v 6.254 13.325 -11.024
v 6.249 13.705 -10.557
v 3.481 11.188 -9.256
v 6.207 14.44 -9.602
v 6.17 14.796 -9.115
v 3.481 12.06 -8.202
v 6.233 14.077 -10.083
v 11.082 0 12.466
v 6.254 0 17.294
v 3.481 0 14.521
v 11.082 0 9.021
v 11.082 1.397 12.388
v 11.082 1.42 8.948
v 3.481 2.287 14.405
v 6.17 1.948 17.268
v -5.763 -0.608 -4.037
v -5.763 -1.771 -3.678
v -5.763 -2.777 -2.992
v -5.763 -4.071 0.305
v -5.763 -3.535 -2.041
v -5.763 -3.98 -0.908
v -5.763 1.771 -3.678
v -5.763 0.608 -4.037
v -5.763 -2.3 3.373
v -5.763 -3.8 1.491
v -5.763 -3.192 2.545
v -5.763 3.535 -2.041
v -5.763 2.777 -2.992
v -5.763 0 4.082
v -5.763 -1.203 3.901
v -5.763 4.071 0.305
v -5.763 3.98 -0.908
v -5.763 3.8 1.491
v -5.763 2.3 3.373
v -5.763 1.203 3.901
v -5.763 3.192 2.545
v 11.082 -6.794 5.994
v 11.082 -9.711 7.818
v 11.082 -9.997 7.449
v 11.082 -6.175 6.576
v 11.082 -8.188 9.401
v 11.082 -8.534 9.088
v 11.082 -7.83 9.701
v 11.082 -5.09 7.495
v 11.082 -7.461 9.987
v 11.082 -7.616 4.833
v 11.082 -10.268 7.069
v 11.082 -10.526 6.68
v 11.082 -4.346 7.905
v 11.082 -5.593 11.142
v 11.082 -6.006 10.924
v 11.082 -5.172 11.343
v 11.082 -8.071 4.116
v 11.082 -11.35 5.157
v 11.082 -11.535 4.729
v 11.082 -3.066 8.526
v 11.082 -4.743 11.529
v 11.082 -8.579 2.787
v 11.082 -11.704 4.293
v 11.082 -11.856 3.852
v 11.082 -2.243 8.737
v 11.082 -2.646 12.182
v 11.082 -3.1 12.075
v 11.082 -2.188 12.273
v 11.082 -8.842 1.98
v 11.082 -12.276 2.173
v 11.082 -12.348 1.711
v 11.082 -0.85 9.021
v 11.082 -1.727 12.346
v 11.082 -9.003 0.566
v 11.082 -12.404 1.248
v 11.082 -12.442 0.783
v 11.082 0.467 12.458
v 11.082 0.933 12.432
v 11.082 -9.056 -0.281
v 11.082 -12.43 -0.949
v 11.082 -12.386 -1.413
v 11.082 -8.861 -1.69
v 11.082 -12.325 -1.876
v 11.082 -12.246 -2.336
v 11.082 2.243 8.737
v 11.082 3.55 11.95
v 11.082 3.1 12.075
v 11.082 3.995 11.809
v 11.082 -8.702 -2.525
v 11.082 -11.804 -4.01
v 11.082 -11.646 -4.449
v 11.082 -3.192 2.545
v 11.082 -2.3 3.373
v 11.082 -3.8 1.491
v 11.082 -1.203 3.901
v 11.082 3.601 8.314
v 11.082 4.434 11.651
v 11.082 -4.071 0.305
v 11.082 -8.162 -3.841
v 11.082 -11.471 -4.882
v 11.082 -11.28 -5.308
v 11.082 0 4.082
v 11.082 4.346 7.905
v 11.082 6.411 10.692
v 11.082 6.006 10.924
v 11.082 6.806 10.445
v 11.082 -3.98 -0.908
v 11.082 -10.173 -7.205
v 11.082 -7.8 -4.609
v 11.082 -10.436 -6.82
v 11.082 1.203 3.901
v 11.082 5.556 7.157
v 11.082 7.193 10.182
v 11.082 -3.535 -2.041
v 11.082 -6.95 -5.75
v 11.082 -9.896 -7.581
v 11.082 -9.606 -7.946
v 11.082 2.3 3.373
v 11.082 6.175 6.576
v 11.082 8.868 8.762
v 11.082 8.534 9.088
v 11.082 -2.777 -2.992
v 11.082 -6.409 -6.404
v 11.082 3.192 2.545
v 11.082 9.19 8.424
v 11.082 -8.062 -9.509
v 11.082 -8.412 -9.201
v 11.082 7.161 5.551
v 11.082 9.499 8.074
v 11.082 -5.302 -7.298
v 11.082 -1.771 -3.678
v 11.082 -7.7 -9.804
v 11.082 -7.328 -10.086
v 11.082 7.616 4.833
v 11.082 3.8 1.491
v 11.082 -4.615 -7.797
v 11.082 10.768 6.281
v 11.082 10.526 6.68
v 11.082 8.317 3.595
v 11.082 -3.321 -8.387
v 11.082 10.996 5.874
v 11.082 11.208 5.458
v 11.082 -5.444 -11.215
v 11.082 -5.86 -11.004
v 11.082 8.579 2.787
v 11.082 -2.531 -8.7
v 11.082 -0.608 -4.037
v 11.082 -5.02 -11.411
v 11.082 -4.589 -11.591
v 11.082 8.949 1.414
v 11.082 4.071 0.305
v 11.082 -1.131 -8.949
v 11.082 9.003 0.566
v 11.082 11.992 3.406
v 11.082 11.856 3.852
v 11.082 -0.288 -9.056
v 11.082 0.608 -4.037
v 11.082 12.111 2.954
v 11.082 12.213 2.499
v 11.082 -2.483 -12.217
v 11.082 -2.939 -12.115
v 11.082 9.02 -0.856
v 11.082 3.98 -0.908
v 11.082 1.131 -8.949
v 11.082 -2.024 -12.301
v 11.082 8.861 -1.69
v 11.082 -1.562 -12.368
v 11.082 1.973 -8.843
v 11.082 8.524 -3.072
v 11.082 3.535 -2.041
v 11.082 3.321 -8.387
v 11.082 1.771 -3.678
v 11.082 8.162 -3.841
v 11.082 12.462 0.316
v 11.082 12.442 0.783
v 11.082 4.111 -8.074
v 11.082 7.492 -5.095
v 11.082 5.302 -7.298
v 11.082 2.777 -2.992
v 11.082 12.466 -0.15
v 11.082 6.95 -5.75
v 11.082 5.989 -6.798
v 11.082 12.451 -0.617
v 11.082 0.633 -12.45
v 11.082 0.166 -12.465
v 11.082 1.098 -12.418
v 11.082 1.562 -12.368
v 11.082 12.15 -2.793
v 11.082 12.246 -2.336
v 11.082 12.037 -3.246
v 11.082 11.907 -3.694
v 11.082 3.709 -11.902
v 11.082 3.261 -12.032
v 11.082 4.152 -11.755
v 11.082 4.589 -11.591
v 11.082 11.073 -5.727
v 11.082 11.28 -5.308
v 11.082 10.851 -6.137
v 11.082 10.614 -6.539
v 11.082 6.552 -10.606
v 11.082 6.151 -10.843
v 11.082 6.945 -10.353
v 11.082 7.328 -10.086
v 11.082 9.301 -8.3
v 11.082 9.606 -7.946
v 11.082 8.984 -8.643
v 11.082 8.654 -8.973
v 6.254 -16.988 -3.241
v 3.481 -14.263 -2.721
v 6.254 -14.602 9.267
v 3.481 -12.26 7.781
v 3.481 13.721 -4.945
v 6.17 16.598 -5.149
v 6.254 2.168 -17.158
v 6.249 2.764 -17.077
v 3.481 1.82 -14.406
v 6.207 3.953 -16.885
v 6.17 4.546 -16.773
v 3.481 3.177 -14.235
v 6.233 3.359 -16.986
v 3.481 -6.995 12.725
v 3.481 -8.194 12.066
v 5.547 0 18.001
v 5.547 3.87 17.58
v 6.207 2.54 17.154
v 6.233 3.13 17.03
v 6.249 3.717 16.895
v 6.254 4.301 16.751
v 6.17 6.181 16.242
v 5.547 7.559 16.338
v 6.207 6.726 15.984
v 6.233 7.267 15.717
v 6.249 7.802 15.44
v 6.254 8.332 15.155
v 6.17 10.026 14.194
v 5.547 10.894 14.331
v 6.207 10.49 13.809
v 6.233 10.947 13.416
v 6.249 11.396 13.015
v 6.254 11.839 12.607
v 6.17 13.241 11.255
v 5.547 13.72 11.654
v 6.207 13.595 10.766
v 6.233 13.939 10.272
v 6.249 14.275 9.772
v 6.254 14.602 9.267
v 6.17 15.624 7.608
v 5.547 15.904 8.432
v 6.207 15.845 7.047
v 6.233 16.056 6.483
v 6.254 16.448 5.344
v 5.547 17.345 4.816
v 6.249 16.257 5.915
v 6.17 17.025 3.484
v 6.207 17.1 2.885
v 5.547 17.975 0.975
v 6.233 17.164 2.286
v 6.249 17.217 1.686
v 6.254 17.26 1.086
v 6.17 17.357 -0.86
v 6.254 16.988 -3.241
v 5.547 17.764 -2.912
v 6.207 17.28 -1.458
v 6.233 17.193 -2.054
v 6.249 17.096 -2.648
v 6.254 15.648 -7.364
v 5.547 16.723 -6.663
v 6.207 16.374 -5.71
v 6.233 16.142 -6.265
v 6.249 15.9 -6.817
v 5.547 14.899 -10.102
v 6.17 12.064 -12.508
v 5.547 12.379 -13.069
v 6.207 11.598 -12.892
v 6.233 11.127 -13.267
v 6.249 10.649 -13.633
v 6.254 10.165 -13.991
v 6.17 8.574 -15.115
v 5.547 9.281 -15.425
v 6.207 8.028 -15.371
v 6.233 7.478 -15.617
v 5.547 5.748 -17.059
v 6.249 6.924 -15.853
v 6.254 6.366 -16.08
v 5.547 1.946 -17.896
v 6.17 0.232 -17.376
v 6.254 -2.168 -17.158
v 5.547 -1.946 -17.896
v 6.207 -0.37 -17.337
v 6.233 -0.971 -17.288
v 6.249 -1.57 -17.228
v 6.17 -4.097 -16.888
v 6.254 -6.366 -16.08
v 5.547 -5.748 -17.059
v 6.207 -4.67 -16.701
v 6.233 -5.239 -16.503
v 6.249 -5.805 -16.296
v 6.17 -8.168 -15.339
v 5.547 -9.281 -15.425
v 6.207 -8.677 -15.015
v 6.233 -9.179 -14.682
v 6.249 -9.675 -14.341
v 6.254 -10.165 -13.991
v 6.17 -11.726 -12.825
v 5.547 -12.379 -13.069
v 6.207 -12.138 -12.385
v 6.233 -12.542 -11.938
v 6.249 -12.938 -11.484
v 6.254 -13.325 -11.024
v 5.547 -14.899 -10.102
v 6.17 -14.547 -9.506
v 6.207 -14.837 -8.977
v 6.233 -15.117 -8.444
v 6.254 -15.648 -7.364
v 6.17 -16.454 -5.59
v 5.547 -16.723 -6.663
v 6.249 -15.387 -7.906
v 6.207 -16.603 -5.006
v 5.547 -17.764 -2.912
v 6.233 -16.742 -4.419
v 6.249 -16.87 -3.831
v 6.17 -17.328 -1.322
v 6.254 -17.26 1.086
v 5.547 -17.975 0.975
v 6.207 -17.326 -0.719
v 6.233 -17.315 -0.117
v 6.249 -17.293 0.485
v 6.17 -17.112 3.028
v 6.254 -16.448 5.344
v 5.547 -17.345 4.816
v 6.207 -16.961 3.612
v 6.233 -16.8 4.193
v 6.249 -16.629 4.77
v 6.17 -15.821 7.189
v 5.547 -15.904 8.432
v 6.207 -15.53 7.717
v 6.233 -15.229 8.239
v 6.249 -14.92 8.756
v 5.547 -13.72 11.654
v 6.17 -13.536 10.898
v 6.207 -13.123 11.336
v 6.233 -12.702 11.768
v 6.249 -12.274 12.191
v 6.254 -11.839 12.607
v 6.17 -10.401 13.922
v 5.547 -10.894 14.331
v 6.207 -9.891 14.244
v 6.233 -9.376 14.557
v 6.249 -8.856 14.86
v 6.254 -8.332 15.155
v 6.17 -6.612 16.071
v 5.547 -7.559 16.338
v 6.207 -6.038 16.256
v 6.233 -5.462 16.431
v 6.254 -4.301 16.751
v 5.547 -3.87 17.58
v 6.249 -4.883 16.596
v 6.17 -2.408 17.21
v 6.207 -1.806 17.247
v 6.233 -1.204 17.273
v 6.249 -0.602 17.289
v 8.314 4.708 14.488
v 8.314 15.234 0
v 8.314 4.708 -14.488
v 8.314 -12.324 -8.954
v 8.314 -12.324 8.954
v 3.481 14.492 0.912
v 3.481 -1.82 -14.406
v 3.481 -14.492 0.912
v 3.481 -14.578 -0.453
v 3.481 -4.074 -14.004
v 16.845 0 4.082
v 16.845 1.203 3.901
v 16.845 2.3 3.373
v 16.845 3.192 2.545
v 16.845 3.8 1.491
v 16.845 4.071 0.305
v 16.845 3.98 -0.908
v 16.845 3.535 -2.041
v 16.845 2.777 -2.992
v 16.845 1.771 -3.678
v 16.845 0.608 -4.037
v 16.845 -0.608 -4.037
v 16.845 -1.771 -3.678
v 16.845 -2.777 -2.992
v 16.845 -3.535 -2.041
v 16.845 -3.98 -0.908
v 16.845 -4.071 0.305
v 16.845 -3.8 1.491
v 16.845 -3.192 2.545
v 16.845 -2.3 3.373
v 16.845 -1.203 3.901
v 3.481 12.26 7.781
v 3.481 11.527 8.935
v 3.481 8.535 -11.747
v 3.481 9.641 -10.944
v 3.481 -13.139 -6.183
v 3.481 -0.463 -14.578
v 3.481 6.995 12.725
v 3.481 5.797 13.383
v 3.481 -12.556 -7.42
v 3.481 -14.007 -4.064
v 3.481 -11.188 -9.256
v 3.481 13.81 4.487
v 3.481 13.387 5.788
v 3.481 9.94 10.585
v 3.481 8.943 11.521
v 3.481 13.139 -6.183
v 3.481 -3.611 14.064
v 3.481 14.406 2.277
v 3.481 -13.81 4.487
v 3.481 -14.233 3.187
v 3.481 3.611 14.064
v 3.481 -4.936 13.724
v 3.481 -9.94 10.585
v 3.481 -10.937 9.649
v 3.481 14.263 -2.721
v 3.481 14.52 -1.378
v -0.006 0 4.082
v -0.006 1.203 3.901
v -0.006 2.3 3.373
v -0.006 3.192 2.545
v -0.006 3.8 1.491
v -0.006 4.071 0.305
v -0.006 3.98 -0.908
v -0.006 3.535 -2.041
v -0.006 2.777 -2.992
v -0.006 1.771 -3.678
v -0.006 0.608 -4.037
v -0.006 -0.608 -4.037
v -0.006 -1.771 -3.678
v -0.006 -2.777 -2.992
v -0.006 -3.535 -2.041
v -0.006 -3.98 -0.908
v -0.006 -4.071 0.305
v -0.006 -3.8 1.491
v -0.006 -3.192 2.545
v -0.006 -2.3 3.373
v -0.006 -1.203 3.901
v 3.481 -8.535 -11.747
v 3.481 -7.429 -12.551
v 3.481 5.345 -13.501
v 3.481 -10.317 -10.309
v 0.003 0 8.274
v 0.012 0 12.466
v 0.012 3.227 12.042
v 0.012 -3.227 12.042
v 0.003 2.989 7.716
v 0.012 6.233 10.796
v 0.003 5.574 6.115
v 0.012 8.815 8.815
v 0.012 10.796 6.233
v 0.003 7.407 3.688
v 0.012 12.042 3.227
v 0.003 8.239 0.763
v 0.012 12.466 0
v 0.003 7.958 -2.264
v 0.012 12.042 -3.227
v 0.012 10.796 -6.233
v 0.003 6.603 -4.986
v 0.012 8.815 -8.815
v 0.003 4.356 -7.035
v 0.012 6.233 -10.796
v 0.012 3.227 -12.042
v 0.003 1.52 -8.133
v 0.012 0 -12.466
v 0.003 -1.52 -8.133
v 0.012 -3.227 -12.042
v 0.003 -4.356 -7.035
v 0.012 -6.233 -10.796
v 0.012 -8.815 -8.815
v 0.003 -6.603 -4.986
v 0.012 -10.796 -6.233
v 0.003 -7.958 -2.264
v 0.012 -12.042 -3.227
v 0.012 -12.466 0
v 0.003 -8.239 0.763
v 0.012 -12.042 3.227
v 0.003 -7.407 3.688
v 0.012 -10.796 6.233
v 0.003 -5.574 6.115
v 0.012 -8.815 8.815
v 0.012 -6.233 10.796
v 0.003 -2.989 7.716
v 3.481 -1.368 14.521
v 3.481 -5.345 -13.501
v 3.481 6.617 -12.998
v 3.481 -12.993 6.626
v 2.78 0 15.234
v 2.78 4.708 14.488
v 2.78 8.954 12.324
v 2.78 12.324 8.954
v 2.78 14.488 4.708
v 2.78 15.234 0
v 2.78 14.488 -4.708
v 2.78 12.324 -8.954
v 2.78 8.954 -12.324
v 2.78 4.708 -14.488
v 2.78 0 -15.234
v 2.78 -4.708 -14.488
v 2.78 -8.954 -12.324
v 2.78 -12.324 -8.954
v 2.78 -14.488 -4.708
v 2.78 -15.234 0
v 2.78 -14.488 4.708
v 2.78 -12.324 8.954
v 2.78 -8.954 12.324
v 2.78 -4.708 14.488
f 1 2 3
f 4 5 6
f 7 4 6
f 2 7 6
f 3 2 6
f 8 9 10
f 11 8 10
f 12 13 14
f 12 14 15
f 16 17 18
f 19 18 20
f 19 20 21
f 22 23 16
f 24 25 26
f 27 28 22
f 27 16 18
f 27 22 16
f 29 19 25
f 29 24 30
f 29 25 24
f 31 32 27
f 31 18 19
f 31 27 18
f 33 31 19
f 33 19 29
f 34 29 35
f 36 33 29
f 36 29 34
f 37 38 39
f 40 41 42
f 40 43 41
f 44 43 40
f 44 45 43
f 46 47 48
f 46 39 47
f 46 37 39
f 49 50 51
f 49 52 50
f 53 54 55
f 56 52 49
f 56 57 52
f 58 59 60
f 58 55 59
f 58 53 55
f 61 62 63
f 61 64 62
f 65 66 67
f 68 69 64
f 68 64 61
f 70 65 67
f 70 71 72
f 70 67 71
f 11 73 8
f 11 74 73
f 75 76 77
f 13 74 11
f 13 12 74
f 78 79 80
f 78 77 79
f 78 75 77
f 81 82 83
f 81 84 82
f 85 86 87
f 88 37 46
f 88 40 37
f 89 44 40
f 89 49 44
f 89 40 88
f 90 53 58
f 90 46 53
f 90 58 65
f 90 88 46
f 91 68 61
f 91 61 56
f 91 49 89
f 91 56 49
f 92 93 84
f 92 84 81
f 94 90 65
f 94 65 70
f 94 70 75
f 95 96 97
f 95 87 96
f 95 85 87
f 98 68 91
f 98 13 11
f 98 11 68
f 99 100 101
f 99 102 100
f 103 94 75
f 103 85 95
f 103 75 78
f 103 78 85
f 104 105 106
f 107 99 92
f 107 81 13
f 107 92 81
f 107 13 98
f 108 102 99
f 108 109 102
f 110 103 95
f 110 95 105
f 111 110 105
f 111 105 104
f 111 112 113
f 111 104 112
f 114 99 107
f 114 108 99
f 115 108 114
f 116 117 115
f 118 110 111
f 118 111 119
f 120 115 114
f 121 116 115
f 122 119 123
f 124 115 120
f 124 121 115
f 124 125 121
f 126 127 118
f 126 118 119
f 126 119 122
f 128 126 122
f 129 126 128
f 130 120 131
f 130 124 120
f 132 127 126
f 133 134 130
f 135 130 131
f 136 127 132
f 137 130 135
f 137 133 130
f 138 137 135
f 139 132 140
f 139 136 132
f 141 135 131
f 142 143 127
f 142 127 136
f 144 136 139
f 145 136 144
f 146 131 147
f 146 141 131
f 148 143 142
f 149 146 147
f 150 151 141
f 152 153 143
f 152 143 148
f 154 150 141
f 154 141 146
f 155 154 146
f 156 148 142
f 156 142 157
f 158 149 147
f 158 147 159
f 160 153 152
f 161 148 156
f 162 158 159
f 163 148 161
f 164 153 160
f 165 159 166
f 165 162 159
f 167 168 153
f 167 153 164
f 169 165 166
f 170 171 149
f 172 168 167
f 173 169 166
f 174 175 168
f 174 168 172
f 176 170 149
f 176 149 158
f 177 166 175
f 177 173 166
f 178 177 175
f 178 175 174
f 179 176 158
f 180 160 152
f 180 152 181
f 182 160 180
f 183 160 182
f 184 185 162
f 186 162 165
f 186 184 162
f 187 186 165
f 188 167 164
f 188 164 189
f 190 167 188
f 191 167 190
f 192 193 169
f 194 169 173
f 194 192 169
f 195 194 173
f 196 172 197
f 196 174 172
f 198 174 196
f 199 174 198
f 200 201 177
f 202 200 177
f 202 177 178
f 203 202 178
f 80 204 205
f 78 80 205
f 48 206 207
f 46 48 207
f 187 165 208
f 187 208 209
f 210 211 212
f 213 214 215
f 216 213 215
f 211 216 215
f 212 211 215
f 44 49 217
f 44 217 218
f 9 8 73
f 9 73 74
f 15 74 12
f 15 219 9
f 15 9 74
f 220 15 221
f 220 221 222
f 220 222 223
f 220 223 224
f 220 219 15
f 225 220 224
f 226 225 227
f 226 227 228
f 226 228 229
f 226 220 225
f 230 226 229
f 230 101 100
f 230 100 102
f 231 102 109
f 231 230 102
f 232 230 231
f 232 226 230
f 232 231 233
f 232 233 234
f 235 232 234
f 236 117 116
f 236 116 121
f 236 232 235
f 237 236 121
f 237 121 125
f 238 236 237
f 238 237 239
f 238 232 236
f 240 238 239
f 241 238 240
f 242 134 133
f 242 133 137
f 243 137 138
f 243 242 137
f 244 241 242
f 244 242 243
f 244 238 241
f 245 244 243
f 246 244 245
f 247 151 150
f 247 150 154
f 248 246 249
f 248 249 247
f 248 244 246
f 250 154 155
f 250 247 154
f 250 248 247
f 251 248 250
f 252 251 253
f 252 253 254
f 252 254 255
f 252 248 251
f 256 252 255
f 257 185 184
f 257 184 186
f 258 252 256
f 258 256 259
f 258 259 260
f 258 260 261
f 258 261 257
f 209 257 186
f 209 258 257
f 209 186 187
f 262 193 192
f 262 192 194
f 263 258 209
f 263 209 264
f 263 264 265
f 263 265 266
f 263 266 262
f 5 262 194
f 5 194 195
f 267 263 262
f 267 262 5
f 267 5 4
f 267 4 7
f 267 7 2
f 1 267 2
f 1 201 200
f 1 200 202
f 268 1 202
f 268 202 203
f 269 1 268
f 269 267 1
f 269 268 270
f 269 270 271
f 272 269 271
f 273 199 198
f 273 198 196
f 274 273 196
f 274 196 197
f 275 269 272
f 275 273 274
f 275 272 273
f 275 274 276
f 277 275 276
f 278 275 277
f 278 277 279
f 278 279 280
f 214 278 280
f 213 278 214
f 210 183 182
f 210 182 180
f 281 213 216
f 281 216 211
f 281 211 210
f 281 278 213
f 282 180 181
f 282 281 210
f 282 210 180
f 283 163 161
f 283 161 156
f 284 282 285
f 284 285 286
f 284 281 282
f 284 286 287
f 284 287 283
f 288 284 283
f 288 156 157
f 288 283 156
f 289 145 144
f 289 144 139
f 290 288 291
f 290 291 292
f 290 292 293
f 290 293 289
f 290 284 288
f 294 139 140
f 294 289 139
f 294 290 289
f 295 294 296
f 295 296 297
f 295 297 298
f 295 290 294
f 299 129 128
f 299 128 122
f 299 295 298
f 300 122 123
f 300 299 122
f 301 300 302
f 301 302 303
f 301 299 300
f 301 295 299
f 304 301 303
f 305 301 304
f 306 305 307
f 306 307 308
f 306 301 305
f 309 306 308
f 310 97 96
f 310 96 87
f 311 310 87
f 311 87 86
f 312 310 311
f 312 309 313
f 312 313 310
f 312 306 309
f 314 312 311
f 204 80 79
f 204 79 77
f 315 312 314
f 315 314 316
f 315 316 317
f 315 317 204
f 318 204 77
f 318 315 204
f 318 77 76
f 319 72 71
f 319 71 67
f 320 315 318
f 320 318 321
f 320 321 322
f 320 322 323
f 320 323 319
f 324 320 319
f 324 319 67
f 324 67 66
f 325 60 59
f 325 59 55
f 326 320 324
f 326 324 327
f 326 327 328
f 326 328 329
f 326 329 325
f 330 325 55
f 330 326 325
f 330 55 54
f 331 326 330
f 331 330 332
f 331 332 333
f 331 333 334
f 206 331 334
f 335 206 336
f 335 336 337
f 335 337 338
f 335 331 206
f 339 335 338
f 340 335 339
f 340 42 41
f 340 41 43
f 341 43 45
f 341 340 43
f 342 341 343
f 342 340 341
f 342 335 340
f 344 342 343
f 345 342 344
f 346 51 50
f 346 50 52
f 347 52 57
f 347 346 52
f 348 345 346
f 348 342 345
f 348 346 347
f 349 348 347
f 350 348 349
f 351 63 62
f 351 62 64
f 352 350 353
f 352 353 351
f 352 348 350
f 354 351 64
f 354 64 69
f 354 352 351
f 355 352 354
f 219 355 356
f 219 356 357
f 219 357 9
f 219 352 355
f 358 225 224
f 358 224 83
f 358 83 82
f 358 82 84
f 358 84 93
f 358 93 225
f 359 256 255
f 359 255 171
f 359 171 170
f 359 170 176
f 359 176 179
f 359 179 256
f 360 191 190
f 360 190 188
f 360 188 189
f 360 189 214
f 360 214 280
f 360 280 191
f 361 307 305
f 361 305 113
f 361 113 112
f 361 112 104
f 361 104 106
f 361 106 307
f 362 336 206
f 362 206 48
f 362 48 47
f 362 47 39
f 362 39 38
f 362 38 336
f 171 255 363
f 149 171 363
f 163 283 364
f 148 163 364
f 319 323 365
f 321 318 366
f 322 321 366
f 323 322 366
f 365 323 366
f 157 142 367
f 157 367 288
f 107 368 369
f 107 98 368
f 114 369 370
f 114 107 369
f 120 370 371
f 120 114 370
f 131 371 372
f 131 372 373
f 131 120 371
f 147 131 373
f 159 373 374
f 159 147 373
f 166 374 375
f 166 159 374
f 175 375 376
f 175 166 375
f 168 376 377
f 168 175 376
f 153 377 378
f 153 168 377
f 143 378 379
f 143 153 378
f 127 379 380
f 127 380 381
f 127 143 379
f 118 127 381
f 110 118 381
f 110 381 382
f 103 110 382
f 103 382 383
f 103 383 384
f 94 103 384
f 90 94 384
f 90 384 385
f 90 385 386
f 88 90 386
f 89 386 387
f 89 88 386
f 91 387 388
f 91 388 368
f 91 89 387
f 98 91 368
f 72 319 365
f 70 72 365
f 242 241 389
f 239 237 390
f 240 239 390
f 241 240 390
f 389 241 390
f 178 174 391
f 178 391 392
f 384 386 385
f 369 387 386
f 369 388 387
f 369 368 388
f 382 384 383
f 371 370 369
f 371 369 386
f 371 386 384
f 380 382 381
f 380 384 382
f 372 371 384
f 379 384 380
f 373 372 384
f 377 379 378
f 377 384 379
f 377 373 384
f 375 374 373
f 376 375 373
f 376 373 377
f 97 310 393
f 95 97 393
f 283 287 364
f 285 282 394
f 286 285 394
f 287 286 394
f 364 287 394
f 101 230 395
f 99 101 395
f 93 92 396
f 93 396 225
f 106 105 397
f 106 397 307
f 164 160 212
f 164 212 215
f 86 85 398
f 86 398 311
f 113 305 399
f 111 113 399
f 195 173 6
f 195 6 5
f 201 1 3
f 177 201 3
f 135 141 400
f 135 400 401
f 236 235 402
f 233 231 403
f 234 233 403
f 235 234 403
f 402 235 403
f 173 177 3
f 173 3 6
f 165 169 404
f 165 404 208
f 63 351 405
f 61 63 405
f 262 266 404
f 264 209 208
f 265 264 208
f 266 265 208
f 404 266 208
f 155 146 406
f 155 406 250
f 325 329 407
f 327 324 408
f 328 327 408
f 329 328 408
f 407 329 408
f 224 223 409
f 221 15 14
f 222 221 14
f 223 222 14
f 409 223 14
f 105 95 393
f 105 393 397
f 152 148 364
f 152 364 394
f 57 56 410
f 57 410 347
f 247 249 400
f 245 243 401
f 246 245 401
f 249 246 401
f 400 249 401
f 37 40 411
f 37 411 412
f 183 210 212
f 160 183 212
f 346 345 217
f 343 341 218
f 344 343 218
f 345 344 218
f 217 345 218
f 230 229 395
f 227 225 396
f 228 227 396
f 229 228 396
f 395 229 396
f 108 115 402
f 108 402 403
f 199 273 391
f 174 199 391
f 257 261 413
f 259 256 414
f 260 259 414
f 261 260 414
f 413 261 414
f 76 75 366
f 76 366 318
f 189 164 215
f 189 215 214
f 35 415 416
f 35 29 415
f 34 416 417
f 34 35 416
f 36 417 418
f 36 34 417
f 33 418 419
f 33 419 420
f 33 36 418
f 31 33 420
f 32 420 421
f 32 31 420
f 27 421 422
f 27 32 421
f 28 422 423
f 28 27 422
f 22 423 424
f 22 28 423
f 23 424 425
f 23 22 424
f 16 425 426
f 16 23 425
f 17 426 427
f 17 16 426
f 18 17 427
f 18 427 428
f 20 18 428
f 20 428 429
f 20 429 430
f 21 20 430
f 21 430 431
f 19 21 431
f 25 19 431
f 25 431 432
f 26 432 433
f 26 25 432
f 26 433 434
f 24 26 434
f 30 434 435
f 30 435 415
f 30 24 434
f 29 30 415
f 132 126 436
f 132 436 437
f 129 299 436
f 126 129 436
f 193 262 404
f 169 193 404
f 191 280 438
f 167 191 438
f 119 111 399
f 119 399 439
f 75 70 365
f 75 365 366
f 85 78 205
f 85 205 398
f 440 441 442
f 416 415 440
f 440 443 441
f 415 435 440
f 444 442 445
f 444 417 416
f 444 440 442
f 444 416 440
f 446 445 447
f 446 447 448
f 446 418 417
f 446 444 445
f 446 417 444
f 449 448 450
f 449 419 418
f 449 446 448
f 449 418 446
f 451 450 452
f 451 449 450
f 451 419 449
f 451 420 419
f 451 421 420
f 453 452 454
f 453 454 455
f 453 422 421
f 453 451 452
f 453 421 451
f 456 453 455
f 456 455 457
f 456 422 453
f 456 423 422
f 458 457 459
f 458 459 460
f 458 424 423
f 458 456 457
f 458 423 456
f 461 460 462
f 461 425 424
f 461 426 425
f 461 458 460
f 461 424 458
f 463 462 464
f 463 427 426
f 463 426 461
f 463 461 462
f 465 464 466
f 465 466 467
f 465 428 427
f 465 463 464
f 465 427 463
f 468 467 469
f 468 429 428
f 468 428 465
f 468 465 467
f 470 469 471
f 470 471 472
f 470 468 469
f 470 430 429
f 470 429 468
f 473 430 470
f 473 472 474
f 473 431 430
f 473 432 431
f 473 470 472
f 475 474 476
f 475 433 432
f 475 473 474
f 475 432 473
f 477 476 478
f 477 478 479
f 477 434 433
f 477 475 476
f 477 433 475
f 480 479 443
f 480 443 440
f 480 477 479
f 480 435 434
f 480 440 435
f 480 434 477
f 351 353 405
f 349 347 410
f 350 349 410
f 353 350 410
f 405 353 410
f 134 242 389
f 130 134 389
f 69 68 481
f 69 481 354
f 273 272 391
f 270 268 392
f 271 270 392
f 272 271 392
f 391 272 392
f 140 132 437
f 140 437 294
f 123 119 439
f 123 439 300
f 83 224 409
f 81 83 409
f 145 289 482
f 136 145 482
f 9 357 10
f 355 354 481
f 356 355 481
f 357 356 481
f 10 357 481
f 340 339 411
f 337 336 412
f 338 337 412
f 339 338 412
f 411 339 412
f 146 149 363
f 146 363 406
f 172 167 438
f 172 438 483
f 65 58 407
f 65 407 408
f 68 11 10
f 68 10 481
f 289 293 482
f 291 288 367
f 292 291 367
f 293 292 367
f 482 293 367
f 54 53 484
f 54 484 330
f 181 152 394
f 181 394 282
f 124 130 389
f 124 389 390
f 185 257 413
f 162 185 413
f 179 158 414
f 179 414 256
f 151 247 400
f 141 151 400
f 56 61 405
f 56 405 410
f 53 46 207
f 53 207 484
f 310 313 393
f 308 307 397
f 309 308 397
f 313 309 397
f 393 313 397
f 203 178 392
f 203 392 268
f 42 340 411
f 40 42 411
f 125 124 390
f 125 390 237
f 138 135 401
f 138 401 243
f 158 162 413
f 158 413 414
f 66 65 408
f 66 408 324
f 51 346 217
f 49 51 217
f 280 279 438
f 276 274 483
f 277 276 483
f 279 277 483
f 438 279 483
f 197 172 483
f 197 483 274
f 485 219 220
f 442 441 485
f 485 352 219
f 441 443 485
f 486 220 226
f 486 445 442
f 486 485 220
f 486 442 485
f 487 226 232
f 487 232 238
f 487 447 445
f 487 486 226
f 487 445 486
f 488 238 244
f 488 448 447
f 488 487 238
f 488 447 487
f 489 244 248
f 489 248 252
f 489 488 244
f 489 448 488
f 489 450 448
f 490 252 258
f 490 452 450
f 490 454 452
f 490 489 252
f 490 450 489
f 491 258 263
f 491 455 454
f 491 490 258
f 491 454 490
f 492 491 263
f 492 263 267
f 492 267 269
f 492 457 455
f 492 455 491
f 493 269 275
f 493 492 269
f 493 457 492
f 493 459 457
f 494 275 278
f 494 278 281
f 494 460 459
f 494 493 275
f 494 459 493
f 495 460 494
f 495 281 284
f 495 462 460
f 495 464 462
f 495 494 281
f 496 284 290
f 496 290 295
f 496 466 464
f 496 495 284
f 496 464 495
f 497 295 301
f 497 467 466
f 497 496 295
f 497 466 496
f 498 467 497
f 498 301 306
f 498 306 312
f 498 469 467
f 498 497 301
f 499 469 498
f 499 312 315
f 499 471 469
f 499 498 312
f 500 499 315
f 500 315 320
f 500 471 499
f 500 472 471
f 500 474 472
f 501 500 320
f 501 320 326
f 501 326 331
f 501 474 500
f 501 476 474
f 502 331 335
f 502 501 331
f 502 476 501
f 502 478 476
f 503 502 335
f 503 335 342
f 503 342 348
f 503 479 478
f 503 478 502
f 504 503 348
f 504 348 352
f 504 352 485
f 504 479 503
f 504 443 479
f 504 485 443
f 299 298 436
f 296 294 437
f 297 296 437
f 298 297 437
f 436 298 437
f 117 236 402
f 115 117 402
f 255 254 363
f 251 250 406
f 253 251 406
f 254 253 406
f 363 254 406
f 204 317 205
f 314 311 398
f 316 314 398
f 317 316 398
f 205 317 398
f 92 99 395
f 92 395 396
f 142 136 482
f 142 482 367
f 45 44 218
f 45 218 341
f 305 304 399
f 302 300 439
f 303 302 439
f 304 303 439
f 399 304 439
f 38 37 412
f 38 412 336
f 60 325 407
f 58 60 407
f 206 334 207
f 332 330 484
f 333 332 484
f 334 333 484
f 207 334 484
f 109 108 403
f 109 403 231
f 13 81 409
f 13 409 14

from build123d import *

# Parameters (mm, degrees)
F7_COUNT = 25
F7_ANGLE = 345.6


with BuildPart() as f1:
    # F0 (on Front) → F1 (revolve)
    with BuildSketch(Plane.XZ):
        Polygon((5.5470483679, 18.0012998082), (0.0122273423, 12.4664593884), (-0.0058063755, 4.0821318731), (-5.763291413, 4.0821318731), (-5.763291413, 0), (0, 0), (16.8451661991, 0), (16.8451661991, 4.0821318731), (11.0818887877, 4.0821318731), (11.0818887877, 12.4664787826), align=None)
    revolve(axis=Axis((8.4225830996, 0, 0), (-1, 0, 0)))


with BuildPart() as f6:
    # F5 (on face) → F6 section 0
    with BuildSketch(Plane(origin=(-5.5200079815, 0, 5.5199886393), x_dir=(0, -1, 0), z_dir=(-0.70710802, 0, 0.7071055423)), mode=Mode.PRIVATE) as f6_s0:
        Polygon((0, 16.6512121101), (0, 12.7288497215), (1.3675010996, 12.7288497215), (2.4401100818, 16.6512121101), align=None)
    loft([f6_s0.sketch, Vertex(23.5484112532, 0, 0)])


with BuildPart() as f7_1:
    # F7: instance of F6
    add(f6.part.rotate(Axis((16.8451661991, 0, 0), (-1, 0, 0)), 1 * F7_ANGLE / (F7_COUNT - 1)))


with BuildPart() as f7_2:
    # F7: instance of F6
    add(f6.part.rotate(Axis((16.8451661991, 0, 0), (-1, 0, 0)), 2 * F7_ANGLE / (F7_COUNT - 1)))


with BuildPart() as f7_3:
    # F7: instance of F6
    add(f6.part.rotate(Axis((16.8451661991, 0, 0), (-1, 0, 0)), 3 * F7_ANGLE / (F7_COUNT - 1)))


with BuildPart() as f7_4:
    # F7: instance of F6
    add(f6.part.rotate(Axis((16.8451661991, 0, 0), (-1, 0, 0)), 4 * F7_ANGLE / (F7_COUNT - 1)))


with BuildPart() as f7_5:
    # F7: instance of F6
    add(f6.part.rotate(Axis((16.8451661991, 0, 0), (-1, 0, 0)), 5 * F7_ANGLE / (F7_COUNT - 1)))


with BuildPart() as f7_6:
    # F7: instance of F6
    add(f6.part.rotate(Axis((16.8451661991, 0, 0), (-1, 0, 0)), 6 * F7_ANGLE / (F7_COUNT - 1)))


with BuildPart() as f7_7:
    # F7: instance of F6
    add(f6.part.rotate(Axis((16.8451661991, 0, 0), (-1, 0, 0)), 7 * F7_ANGLE / (F7_COUNT - 1)))


with BuildPart() as f7_8:
    # F7: instance of F6
    add(f6.part.rotate(Axis((16.8451661991, 0, 0), (-1, 0, 0)), 8 * F7_ANGLE / (F7_COUNT - 1)))


with BuildPart() as f7_9:
    # F7: instance of F6
    add(f6.part.rotate(Axis((16.8451661991, 0, 0), (-1, 0, 0)), 9 * F7_ANGLE / (F7_COUNT - 1)))


with BuildPart() as f7_10:
    # F7: instance of F6
    add(f6.part.rotate(Axis((16.8451661991, 0, 0), (-1, 0, 0)), 10 * F7_ANGLE / (F7_COUNT - 1)))


with BuildPart() as f7_11:
    # F7: instance of F6
    add(f6.part.rotate(Axis((16.8451661991, 0, 0), (-1, 0, 0)), 11 * F7_ANGLE / (F7_COUNT - 1)))


with BuildPart() as f7_12:
    # F7: instance of F6
    add(f6.part.rotate(Axis((16.8451661991, 0, 0), (-1, 0, 0)), 12 * F7_ANGLE / (F7_COUNT - 1)))


with BuildPart() as f7_13:
    # F7: instance of F6
    add(f6.part.rotate(Axis((16.8451661991, 0, 0), (-1, 0, 0)), 13 * F7_ANGLE / (F7_COUNT - 1)))


with BuildPart() as f7_14:
    # F7: instance of F6
    add(f6.part.rotate(Axis((16.8451661991, 0, 0), (-1, 0, 0)), 14 * F7_ANGLE / (F7_COUNT - 1)))


with BuildPart() as f7_15:
    # F7: instance of F6
    add(f6.part.rotate(Axis((16.8451661991, 0, 0), (-1, 0, 0)), 15 * F7_ANGLE / (F7_COUNT - 1)))


with BuildPart() as f7_16:
    # F7: instance of F6
    add(f6.part.rotate(Axis((16.8451661991, 0, 0), (-1, 0, 0)), 16 * F7_ANGLE / (F7_COUNT - 1)))


with BuildPart() as f7_17:
    # F7: instance of F6
    add(f6.part.rotate(Axis((16.8451661991, 0, 0), (-1, 0, 0)), 17 * F7_ANGLE / (F7_COUNT - 1)))


with BuildPart() as f7_18:
    # F7: instance of F6
    add(f6.part.rotate(Axis((16.8451661991, 0, 0), (-1, 0, 0)), 18 * F7_ANGLE / (F7_COUNT - 1)))


with BuildPart() as f7_19:
    # F7: instance of F6
    add(f6.part.rotate(Axis((16.8451661991, 0, 0), (-1, 0, 0)), 19 * F7_ANGLE / (F7_COUNT - 1)))


with BuildPart() as f7_20:
    # F7: instance of F6
    add(f6.part.rotate(Axis((16.8451661991, 0, 0), (-1, 0, 0)), 20 * F7_ANGLE / (F7_COUNT - 1)))


with BuildPart() as f7_21:
    # F7: instance of F6
    add(f6.part.rotate(Axis((16.8451661991, 0, 0), (-1, 0, 0)), 21 * F7_ANGLE / (F7_COUNT - 1)))


with BuildPart() as f7_22:
    # F7: instance of F6
    add(f6.part.rotate(Axis((16.8451661991, 0, 0), (-1, 0, 0)), 22 * F7_ANGLE / (F7_COUNT - 1)))


with BuildPart() as f7_23:
    # F7: instance of F6
    add(f6.part.rotate(Axis((16.8451661991, 0, 0), (-1, 0, 0)), 23 * F7_ANGLE / (F7_COUNT - 1)))


with BuildPart() as f7_24:
    # F7: instance of F6
    add(f6.part.rotate(Axis((16.8451661991, 0, 0), (-1, 0, 0)), 24 * F7_ANGLE / (F7_COUNT - 1)))


with BuildPart() as f1_1:
    add(f1.part)

    # F8: cut F6, F7_1, F7_2, F7_3, F7_4, F7_5, F7_6, F7_7, F7_8, F7_9, F7_10, F7_11, F7_12, F7_13, F7_14, F7_15, F7_16, F7_17, F7_18, F7_19, F7_20, F7_21, F7_22, F7_23, F7_24
    add(f6.part, mode=Mode.SUBTRACT)
    add(f7_1.part, mode=Mode.SUBTRACT)
    add(f7_2.part, mode=Mode.SUBTRACT)
    add(f7_3.part, mode=Mode.SUBTRACT)
    add(f7_4.part, mode=Mode.SUBTRACT)
    add(f7_5.part, mode=Mode.SUBTRACT)
    add(f7_6.part, mode=Mode.SUBTRACT)
    add(f7_7.part, mode=Mode.SUBTRACT)
    add(f7_8.part, mode=Mode.SUBTRACT)
    add(f7_9.part, mode=Mode.SUBTRACT)
    add(f7_10.part, mode=Mode.SUBTRACT)
    add(f7_11.part, mode=Mode.SUBTRACT)
    add(f7_12.part, mode=Mode.SUBTRACT)
    add(f7_13.part, mode=Mode.SUBTRACT)
    add(f7_14.part, mode=Mode.SUBTRACT)
    add(f7_15.part, mode=Mode.SUBTRACT)
    add(f7_16.part, mode=Mode.SUBTRACT)
    add(f7_17.part, mode=Mode.SUBTRACT)
    add(f7_18.part, mode=Mode.SUBTRACT)
    add(f7_19.part, mode=Mode.SUBTRACT)
    add(f7_20.part, mode=Mode.SUBTRACT)
    add(f7_21.part, mode=Mode.SUBTRACT)
    add(f7_22.part, mode=Mode.SUBTRACT)
    add(f7_23.part, mode=Mode.SUBTRACT)
    add(f7_24.part, mode=Mode.SUBTRACT)


solid = f1_1.part
